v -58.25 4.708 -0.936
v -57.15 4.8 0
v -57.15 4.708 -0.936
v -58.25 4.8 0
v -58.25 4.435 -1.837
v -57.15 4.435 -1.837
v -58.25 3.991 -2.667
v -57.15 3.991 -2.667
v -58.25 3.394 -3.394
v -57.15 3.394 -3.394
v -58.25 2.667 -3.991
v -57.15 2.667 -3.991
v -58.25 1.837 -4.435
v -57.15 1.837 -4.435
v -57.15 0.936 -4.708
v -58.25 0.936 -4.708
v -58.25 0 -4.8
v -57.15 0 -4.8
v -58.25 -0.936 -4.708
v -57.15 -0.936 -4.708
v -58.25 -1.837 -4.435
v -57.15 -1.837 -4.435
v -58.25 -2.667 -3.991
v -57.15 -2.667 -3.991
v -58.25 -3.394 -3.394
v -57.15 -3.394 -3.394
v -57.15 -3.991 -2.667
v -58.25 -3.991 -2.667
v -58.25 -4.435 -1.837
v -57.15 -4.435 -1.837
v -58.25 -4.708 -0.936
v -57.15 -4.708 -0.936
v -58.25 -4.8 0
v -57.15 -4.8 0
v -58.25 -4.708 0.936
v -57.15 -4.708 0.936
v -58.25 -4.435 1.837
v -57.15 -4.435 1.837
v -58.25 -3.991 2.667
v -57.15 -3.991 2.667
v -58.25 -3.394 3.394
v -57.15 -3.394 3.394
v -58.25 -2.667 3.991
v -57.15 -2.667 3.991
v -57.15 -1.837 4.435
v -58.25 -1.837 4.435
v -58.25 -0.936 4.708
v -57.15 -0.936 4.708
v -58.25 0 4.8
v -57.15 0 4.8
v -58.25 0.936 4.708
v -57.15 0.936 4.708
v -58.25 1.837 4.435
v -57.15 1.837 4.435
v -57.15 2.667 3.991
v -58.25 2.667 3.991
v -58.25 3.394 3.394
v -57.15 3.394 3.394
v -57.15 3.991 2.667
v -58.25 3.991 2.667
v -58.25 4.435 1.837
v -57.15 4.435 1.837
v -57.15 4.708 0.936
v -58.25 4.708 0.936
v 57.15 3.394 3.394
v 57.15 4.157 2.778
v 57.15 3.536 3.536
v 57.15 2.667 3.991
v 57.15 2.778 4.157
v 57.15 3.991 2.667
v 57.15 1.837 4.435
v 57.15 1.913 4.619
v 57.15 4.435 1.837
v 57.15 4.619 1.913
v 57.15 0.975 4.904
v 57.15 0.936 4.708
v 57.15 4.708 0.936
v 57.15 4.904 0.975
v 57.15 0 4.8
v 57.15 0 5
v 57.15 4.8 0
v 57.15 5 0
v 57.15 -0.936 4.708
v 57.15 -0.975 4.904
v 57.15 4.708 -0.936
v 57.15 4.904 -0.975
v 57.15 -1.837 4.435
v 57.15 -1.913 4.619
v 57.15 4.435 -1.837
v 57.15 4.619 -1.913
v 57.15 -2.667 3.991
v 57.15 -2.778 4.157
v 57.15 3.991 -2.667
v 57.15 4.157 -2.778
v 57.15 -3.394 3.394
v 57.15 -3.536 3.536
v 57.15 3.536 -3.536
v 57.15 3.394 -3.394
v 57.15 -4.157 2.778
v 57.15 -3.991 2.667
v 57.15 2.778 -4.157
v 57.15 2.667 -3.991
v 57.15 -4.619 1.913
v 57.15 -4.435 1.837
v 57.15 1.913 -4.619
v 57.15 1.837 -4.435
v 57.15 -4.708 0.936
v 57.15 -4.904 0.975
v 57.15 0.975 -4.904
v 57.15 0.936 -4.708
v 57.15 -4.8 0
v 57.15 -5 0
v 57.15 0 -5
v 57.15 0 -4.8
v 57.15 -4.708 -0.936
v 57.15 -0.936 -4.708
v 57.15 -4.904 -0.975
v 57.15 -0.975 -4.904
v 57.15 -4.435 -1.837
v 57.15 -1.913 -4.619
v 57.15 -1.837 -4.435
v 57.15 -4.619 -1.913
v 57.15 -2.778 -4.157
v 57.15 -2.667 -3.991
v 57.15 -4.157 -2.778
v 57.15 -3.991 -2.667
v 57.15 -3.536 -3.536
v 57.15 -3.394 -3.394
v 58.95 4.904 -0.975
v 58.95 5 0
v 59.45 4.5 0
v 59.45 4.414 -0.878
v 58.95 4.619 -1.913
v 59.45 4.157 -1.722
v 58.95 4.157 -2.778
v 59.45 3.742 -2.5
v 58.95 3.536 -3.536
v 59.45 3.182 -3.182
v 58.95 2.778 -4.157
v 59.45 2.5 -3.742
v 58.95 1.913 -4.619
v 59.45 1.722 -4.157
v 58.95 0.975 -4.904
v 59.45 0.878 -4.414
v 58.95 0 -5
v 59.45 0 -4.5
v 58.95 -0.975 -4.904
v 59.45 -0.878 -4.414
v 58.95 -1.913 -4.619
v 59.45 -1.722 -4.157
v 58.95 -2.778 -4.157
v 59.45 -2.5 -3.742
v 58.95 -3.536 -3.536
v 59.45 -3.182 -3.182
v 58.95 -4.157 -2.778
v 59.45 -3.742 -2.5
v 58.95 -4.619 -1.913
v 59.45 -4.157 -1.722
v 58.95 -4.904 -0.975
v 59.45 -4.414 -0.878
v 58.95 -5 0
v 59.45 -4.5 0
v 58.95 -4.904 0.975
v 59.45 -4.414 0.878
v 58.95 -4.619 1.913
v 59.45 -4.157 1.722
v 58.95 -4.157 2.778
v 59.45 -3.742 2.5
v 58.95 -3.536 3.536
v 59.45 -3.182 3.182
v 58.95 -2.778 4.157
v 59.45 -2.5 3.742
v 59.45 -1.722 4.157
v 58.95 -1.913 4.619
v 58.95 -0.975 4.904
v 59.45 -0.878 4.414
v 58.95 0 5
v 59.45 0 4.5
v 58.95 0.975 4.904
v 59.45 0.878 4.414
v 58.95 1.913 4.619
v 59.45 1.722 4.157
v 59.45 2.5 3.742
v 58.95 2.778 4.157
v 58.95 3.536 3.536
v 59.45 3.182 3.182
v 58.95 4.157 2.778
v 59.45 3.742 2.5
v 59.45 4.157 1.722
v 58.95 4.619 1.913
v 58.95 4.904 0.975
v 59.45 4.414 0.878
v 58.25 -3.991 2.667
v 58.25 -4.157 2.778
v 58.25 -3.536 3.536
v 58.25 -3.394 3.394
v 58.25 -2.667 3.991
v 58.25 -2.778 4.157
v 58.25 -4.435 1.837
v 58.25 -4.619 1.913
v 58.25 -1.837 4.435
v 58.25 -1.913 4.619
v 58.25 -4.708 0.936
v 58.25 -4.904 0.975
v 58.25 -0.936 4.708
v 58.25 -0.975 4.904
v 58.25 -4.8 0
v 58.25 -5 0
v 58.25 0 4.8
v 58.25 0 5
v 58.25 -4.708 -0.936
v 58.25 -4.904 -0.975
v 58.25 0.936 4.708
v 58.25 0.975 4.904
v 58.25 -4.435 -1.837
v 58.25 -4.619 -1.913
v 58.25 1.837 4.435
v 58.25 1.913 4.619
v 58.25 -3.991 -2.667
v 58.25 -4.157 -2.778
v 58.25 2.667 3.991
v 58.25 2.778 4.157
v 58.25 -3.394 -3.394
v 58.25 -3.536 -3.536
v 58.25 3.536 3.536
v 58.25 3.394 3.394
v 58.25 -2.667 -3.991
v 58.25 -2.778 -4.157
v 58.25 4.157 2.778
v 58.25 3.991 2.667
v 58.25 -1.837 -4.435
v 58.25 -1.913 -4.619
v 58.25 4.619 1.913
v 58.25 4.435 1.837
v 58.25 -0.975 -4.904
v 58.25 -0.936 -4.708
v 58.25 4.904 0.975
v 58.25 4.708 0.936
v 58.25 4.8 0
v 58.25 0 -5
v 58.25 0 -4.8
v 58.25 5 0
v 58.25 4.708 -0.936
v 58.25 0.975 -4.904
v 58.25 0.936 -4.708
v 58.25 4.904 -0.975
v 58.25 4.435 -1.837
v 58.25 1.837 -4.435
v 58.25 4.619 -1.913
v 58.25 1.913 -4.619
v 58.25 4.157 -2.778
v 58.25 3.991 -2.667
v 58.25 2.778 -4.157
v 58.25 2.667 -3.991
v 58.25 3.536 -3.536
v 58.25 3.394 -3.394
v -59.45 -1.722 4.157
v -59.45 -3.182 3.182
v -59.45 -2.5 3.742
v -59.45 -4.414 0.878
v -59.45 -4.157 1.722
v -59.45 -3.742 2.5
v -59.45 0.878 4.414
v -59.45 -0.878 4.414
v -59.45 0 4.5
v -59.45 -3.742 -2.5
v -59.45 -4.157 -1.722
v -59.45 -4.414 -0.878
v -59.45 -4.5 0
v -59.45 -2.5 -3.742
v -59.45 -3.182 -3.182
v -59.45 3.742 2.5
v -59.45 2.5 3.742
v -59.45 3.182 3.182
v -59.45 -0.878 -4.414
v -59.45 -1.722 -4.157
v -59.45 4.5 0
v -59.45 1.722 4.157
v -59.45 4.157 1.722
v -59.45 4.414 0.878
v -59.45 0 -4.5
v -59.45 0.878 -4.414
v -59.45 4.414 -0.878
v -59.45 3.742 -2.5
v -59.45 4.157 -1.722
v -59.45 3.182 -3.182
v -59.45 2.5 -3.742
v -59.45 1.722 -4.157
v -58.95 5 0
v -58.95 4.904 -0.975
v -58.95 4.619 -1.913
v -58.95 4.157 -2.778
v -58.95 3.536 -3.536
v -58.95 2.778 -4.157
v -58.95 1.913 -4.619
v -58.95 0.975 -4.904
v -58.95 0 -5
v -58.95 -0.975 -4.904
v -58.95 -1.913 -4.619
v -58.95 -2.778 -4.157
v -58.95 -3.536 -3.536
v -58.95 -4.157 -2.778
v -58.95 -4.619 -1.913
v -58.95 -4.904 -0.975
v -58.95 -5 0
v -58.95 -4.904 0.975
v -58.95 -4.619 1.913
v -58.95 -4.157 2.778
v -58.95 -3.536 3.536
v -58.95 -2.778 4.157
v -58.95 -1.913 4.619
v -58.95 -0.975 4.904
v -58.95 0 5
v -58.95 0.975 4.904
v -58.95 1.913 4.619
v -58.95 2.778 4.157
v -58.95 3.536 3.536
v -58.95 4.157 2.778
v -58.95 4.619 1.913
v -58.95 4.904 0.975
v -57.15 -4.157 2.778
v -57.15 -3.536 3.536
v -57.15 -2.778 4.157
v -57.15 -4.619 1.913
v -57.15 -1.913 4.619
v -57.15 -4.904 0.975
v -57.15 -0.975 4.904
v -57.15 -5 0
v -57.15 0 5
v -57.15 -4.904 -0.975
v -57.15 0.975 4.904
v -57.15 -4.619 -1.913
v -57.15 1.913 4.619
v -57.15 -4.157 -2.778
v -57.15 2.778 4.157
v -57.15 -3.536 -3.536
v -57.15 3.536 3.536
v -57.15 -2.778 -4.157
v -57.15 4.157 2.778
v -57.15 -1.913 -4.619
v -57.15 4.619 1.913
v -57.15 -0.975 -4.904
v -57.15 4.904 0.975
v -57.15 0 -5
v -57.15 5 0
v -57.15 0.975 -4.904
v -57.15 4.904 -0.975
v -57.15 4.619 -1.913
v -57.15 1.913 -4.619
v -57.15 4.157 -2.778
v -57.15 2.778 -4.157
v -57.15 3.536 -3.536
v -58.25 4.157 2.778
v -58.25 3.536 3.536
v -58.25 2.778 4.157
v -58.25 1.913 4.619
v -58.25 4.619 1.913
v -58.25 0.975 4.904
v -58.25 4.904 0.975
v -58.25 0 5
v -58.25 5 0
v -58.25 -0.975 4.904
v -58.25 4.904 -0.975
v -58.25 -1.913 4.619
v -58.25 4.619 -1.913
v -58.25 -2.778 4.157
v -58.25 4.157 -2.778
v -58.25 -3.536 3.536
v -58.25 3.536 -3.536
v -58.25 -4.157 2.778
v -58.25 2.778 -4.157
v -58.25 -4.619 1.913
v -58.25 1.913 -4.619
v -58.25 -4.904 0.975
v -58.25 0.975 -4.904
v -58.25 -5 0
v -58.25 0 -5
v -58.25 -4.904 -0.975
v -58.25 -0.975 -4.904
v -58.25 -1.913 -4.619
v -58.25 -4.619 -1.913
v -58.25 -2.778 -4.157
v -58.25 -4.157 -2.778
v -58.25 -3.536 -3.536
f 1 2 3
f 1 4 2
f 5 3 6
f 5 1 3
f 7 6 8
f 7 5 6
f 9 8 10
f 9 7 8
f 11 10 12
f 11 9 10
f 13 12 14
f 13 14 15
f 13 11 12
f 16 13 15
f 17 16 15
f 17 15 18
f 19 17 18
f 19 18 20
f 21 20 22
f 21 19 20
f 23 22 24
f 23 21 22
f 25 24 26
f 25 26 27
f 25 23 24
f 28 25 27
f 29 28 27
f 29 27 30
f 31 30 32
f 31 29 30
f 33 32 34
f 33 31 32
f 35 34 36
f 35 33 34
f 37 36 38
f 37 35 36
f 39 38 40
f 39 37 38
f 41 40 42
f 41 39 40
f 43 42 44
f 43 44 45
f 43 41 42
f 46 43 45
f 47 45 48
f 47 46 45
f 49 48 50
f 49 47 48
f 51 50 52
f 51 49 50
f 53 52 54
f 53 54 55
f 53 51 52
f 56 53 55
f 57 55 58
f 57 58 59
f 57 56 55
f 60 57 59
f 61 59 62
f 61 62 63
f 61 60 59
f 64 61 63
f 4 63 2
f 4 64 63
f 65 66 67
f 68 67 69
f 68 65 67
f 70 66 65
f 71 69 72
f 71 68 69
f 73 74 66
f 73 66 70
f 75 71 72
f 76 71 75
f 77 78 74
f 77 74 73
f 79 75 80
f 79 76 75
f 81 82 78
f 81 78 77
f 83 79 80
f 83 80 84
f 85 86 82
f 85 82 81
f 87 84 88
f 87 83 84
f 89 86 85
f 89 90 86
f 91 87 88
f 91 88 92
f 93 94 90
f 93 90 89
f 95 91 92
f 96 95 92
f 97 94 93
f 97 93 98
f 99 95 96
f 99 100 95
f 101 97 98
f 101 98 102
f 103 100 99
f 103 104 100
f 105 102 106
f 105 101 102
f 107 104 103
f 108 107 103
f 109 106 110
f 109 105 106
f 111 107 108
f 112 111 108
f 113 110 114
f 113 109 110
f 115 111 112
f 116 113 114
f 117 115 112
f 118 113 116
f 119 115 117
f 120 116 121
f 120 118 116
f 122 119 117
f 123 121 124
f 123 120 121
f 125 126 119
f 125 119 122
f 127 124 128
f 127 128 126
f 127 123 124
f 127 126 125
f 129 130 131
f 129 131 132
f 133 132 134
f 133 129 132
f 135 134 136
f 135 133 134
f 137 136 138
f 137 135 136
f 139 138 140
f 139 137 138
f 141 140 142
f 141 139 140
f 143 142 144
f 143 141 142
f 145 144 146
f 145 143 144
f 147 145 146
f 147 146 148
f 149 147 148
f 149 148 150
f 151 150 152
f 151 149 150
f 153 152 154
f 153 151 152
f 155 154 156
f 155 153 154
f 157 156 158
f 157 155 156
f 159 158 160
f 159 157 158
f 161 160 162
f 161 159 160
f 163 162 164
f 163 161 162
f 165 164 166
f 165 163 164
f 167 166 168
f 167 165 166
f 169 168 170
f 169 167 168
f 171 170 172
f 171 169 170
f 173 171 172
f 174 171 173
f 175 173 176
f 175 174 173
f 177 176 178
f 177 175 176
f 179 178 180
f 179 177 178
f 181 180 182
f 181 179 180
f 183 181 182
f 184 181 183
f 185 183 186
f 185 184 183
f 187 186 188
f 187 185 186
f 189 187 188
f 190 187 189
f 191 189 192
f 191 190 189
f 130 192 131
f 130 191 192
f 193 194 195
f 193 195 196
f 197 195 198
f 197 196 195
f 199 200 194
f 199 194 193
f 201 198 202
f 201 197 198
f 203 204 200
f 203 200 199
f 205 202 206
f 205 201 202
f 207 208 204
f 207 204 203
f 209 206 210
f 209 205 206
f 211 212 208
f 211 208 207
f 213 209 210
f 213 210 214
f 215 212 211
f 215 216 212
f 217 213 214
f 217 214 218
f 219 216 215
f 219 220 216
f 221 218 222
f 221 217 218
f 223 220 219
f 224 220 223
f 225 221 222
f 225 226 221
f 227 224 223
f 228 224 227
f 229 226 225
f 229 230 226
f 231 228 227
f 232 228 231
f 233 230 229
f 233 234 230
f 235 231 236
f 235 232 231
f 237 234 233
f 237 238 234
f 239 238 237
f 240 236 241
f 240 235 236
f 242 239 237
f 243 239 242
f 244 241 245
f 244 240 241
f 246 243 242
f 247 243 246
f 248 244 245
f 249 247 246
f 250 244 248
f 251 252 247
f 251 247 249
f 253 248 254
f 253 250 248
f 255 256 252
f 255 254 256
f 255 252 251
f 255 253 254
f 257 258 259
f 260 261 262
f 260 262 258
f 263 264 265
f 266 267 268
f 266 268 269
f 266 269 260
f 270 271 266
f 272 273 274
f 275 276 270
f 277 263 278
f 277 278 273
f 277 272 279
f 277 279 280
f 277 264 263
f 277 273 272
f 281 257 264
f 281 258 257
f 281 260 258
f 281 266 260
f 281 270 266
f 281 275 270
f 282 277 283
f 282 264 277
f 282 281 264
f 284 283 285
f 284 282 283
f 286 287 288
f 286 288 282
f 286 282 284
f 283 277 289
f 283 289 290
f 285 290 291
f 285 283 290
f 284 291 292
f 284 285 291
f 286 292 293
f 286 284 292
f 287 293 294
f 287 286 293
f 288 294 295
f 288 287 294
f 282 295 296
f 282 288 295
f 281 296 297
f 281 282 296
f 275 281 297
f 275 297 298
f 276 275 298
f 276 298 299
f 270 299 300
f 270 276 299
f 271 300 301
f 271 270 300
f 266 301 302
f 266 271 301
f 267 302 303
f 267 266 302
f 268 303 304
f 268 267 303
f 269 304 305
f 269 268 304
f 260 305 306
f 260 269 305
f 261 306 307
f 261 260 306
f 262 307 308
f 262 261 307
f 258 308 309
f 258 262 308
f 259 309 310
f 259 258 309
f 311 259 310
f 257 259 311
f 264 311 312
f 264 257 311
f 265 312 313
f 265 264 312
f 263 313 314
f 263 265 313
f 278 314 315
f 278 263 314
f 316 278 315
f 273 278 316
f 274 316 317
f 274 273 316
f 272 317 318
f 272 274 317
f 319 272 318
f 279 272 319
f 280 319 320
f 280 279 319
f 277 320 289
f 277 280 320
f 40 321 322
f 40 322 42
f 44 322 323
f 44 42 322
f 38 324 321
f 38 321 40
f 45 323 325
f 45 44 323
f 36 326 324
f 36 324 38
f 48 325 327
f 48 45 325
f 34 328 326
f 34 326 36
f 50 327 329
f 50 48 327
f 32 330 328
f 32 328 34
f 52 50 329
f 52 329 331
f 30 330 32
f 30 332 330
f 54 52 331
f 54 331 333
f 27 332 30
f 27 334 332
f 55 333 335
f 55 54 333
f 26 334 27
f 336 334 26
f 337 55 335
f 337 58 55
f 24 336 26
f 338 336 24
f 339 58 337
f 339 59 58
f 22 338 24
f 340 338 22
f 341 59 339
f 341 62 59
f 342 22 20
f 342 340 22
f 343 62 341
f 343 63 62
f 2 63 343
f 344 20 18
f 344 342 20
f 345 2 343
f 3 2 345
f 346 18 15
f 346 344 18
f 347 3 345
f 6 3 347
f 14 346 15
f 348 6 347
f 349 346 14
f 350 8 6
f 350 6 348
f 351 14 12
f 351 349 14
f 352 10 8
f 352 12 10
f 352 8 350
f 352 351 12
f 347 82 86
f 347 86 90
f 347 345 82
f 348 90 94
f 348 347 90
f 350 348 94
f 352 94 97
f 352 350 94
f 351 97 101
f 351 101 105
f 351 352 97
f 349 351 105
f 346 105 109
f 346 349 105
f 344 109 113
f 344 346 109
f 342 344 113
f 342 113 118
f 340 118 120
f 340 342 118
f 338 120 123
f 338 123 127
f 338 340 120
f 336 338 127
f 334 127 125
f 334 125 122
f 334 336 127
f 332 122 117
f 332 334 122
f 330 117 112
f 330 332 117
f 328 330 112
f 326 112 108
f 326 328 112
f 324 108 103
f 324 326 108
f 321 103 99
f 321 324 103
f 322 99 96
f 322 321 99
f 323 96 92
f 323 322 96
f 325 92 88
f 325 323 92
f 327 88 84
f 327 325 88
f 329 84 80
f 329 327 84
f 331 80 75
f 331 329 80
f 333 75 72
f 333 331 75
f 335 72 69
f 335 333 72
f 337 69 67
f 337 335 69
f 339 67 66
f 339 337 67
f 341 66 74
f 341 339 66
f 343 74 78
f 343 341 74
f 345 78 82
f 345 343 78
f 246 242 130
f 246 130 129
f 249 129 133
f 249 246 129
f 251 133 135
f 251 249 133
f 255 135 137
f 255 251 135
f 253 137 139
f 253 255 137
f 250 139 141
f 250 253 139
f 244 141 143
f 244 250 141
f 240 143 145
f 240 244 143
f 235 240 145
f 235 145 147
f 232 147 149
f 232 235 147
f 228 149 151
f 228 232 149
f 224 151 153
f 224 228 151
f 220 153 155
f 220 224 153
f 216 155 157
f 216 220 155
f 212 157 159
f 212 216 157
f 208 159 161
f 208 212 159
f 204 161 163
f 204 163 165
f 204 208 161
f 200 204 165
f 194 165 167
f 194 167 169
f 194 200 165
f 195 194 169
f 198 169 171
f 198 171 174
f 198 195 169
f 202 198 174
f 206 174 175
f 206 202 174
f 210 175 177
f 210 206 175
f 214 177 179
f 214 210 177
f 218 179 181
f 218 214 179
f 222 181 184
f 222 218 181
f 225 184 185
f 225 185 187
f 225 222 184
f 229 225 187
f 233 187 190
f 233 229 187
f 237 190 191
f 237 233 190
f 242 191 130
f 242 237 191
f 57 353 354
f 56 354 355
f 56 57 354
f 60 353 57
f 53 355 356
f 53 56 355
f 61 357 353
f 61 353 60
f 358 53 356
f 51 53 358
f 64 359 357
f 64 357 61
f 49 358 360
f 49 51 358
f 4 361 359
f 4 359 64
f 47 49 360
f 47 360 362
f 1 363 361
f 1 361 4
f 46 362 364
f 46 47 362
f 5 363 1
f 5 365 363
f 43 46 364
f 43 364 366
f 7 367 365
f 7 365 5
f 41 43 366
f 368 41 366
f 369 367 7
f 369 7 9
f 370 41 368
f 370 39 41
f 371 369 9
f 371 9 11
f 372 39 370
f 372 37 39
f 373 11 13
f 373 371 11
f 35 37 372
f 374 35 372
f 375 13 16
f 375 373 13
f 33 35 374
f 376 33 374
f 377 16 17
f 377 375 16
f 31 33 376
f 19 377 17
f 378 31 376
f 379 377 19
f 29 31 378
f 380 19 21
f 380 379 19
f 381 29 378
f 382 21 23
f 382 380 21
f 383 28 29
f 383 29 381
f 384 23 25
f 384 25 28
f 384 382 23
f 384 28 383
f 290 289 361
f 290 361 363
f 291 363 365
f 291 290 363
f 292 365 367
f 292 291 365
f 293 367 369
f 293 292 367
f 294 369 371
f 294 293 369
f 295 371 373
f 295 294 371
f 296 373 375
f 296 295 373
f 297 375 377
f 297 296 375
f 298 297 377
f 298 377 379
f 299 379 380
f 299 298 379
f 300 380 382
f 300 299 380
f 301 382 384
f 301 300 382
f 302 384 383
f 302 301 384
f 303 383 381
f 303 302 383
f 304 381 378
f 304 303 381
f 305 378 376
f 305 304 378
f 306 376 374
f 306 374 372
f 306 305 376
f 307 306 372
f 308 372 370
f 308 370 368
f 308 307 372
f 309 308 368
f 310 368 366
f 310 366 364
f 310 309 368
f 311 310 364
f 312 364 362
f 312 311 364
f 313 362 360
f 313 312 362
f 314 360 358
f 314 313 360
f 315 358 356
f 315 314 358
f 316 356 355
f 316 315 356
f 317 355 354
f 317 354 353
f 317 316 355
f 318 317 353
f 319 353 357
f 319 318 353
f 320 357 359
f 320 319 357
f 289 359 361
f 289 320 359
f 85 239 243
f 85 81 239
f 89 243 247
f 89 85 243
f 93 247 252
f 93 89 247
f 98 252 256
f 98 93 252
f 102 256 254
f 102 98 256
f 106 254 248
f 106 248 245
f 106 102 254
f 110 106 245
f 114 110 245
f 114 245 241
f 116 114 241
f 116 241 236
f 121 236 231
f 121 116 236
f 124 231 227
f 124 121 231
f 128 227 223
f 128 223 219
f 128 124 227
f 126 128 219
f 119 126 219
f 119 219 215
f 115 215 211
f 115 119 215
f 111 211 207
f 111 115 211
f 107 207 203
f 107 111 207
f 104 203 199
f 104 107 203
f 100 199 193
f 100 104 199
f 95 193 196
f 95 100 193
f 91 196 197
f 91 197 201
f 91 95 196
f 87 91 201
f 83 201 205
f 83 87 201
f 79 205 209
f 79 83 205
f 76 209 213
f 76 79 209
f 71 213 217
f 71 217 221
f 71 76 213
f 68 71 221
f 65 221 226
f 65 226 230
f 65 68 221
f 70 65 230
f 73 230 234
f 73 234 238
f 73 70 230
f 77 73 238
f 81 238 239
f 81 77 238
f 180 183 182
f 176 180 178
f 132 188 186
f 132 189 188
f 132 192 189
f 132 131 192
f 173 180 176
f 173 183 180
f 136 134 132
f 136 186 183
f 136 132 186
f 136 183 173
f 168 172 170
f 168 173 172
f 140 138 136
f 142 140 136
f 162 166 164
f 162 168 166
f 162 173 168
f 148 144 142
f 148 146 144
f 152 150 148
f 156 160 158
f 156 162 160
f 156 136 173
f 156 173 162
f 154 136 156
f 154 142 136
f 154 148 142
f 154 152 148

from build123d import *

# Parameters (mm, degrees)
CHAMFER_1_SIZE = 0.5


with BuildPart() as part:
    # Sketch 1 → Revolve 1 (revolve)
    with BuildSketch(Plane.XY):
        Polygon((59.45, 0), (59.45, 5), (58.25, 5), (58.25, 4.8), (57.15, 4.8), (57.15, 5), (-57.15, 5), (-57.15, 4.8), (-58.25, 4.8), (-58.25, 5), (-59.45, 5), (-59.45, 0), align=None)
    revolve(axis=Axis((59.45, 0, 0), (-1, 0, 0)))

    # Chamfer 1
    chamfer_1_edges = [part.edges().sort_by_distance(p)[0] for p in [
        (-59.45, -5, 0),
        (59.45, -5, 0),
    ]]
    chamfer(chamfer_1_edges, length=CHAMFER_1_SIZE)


solid = part.part
